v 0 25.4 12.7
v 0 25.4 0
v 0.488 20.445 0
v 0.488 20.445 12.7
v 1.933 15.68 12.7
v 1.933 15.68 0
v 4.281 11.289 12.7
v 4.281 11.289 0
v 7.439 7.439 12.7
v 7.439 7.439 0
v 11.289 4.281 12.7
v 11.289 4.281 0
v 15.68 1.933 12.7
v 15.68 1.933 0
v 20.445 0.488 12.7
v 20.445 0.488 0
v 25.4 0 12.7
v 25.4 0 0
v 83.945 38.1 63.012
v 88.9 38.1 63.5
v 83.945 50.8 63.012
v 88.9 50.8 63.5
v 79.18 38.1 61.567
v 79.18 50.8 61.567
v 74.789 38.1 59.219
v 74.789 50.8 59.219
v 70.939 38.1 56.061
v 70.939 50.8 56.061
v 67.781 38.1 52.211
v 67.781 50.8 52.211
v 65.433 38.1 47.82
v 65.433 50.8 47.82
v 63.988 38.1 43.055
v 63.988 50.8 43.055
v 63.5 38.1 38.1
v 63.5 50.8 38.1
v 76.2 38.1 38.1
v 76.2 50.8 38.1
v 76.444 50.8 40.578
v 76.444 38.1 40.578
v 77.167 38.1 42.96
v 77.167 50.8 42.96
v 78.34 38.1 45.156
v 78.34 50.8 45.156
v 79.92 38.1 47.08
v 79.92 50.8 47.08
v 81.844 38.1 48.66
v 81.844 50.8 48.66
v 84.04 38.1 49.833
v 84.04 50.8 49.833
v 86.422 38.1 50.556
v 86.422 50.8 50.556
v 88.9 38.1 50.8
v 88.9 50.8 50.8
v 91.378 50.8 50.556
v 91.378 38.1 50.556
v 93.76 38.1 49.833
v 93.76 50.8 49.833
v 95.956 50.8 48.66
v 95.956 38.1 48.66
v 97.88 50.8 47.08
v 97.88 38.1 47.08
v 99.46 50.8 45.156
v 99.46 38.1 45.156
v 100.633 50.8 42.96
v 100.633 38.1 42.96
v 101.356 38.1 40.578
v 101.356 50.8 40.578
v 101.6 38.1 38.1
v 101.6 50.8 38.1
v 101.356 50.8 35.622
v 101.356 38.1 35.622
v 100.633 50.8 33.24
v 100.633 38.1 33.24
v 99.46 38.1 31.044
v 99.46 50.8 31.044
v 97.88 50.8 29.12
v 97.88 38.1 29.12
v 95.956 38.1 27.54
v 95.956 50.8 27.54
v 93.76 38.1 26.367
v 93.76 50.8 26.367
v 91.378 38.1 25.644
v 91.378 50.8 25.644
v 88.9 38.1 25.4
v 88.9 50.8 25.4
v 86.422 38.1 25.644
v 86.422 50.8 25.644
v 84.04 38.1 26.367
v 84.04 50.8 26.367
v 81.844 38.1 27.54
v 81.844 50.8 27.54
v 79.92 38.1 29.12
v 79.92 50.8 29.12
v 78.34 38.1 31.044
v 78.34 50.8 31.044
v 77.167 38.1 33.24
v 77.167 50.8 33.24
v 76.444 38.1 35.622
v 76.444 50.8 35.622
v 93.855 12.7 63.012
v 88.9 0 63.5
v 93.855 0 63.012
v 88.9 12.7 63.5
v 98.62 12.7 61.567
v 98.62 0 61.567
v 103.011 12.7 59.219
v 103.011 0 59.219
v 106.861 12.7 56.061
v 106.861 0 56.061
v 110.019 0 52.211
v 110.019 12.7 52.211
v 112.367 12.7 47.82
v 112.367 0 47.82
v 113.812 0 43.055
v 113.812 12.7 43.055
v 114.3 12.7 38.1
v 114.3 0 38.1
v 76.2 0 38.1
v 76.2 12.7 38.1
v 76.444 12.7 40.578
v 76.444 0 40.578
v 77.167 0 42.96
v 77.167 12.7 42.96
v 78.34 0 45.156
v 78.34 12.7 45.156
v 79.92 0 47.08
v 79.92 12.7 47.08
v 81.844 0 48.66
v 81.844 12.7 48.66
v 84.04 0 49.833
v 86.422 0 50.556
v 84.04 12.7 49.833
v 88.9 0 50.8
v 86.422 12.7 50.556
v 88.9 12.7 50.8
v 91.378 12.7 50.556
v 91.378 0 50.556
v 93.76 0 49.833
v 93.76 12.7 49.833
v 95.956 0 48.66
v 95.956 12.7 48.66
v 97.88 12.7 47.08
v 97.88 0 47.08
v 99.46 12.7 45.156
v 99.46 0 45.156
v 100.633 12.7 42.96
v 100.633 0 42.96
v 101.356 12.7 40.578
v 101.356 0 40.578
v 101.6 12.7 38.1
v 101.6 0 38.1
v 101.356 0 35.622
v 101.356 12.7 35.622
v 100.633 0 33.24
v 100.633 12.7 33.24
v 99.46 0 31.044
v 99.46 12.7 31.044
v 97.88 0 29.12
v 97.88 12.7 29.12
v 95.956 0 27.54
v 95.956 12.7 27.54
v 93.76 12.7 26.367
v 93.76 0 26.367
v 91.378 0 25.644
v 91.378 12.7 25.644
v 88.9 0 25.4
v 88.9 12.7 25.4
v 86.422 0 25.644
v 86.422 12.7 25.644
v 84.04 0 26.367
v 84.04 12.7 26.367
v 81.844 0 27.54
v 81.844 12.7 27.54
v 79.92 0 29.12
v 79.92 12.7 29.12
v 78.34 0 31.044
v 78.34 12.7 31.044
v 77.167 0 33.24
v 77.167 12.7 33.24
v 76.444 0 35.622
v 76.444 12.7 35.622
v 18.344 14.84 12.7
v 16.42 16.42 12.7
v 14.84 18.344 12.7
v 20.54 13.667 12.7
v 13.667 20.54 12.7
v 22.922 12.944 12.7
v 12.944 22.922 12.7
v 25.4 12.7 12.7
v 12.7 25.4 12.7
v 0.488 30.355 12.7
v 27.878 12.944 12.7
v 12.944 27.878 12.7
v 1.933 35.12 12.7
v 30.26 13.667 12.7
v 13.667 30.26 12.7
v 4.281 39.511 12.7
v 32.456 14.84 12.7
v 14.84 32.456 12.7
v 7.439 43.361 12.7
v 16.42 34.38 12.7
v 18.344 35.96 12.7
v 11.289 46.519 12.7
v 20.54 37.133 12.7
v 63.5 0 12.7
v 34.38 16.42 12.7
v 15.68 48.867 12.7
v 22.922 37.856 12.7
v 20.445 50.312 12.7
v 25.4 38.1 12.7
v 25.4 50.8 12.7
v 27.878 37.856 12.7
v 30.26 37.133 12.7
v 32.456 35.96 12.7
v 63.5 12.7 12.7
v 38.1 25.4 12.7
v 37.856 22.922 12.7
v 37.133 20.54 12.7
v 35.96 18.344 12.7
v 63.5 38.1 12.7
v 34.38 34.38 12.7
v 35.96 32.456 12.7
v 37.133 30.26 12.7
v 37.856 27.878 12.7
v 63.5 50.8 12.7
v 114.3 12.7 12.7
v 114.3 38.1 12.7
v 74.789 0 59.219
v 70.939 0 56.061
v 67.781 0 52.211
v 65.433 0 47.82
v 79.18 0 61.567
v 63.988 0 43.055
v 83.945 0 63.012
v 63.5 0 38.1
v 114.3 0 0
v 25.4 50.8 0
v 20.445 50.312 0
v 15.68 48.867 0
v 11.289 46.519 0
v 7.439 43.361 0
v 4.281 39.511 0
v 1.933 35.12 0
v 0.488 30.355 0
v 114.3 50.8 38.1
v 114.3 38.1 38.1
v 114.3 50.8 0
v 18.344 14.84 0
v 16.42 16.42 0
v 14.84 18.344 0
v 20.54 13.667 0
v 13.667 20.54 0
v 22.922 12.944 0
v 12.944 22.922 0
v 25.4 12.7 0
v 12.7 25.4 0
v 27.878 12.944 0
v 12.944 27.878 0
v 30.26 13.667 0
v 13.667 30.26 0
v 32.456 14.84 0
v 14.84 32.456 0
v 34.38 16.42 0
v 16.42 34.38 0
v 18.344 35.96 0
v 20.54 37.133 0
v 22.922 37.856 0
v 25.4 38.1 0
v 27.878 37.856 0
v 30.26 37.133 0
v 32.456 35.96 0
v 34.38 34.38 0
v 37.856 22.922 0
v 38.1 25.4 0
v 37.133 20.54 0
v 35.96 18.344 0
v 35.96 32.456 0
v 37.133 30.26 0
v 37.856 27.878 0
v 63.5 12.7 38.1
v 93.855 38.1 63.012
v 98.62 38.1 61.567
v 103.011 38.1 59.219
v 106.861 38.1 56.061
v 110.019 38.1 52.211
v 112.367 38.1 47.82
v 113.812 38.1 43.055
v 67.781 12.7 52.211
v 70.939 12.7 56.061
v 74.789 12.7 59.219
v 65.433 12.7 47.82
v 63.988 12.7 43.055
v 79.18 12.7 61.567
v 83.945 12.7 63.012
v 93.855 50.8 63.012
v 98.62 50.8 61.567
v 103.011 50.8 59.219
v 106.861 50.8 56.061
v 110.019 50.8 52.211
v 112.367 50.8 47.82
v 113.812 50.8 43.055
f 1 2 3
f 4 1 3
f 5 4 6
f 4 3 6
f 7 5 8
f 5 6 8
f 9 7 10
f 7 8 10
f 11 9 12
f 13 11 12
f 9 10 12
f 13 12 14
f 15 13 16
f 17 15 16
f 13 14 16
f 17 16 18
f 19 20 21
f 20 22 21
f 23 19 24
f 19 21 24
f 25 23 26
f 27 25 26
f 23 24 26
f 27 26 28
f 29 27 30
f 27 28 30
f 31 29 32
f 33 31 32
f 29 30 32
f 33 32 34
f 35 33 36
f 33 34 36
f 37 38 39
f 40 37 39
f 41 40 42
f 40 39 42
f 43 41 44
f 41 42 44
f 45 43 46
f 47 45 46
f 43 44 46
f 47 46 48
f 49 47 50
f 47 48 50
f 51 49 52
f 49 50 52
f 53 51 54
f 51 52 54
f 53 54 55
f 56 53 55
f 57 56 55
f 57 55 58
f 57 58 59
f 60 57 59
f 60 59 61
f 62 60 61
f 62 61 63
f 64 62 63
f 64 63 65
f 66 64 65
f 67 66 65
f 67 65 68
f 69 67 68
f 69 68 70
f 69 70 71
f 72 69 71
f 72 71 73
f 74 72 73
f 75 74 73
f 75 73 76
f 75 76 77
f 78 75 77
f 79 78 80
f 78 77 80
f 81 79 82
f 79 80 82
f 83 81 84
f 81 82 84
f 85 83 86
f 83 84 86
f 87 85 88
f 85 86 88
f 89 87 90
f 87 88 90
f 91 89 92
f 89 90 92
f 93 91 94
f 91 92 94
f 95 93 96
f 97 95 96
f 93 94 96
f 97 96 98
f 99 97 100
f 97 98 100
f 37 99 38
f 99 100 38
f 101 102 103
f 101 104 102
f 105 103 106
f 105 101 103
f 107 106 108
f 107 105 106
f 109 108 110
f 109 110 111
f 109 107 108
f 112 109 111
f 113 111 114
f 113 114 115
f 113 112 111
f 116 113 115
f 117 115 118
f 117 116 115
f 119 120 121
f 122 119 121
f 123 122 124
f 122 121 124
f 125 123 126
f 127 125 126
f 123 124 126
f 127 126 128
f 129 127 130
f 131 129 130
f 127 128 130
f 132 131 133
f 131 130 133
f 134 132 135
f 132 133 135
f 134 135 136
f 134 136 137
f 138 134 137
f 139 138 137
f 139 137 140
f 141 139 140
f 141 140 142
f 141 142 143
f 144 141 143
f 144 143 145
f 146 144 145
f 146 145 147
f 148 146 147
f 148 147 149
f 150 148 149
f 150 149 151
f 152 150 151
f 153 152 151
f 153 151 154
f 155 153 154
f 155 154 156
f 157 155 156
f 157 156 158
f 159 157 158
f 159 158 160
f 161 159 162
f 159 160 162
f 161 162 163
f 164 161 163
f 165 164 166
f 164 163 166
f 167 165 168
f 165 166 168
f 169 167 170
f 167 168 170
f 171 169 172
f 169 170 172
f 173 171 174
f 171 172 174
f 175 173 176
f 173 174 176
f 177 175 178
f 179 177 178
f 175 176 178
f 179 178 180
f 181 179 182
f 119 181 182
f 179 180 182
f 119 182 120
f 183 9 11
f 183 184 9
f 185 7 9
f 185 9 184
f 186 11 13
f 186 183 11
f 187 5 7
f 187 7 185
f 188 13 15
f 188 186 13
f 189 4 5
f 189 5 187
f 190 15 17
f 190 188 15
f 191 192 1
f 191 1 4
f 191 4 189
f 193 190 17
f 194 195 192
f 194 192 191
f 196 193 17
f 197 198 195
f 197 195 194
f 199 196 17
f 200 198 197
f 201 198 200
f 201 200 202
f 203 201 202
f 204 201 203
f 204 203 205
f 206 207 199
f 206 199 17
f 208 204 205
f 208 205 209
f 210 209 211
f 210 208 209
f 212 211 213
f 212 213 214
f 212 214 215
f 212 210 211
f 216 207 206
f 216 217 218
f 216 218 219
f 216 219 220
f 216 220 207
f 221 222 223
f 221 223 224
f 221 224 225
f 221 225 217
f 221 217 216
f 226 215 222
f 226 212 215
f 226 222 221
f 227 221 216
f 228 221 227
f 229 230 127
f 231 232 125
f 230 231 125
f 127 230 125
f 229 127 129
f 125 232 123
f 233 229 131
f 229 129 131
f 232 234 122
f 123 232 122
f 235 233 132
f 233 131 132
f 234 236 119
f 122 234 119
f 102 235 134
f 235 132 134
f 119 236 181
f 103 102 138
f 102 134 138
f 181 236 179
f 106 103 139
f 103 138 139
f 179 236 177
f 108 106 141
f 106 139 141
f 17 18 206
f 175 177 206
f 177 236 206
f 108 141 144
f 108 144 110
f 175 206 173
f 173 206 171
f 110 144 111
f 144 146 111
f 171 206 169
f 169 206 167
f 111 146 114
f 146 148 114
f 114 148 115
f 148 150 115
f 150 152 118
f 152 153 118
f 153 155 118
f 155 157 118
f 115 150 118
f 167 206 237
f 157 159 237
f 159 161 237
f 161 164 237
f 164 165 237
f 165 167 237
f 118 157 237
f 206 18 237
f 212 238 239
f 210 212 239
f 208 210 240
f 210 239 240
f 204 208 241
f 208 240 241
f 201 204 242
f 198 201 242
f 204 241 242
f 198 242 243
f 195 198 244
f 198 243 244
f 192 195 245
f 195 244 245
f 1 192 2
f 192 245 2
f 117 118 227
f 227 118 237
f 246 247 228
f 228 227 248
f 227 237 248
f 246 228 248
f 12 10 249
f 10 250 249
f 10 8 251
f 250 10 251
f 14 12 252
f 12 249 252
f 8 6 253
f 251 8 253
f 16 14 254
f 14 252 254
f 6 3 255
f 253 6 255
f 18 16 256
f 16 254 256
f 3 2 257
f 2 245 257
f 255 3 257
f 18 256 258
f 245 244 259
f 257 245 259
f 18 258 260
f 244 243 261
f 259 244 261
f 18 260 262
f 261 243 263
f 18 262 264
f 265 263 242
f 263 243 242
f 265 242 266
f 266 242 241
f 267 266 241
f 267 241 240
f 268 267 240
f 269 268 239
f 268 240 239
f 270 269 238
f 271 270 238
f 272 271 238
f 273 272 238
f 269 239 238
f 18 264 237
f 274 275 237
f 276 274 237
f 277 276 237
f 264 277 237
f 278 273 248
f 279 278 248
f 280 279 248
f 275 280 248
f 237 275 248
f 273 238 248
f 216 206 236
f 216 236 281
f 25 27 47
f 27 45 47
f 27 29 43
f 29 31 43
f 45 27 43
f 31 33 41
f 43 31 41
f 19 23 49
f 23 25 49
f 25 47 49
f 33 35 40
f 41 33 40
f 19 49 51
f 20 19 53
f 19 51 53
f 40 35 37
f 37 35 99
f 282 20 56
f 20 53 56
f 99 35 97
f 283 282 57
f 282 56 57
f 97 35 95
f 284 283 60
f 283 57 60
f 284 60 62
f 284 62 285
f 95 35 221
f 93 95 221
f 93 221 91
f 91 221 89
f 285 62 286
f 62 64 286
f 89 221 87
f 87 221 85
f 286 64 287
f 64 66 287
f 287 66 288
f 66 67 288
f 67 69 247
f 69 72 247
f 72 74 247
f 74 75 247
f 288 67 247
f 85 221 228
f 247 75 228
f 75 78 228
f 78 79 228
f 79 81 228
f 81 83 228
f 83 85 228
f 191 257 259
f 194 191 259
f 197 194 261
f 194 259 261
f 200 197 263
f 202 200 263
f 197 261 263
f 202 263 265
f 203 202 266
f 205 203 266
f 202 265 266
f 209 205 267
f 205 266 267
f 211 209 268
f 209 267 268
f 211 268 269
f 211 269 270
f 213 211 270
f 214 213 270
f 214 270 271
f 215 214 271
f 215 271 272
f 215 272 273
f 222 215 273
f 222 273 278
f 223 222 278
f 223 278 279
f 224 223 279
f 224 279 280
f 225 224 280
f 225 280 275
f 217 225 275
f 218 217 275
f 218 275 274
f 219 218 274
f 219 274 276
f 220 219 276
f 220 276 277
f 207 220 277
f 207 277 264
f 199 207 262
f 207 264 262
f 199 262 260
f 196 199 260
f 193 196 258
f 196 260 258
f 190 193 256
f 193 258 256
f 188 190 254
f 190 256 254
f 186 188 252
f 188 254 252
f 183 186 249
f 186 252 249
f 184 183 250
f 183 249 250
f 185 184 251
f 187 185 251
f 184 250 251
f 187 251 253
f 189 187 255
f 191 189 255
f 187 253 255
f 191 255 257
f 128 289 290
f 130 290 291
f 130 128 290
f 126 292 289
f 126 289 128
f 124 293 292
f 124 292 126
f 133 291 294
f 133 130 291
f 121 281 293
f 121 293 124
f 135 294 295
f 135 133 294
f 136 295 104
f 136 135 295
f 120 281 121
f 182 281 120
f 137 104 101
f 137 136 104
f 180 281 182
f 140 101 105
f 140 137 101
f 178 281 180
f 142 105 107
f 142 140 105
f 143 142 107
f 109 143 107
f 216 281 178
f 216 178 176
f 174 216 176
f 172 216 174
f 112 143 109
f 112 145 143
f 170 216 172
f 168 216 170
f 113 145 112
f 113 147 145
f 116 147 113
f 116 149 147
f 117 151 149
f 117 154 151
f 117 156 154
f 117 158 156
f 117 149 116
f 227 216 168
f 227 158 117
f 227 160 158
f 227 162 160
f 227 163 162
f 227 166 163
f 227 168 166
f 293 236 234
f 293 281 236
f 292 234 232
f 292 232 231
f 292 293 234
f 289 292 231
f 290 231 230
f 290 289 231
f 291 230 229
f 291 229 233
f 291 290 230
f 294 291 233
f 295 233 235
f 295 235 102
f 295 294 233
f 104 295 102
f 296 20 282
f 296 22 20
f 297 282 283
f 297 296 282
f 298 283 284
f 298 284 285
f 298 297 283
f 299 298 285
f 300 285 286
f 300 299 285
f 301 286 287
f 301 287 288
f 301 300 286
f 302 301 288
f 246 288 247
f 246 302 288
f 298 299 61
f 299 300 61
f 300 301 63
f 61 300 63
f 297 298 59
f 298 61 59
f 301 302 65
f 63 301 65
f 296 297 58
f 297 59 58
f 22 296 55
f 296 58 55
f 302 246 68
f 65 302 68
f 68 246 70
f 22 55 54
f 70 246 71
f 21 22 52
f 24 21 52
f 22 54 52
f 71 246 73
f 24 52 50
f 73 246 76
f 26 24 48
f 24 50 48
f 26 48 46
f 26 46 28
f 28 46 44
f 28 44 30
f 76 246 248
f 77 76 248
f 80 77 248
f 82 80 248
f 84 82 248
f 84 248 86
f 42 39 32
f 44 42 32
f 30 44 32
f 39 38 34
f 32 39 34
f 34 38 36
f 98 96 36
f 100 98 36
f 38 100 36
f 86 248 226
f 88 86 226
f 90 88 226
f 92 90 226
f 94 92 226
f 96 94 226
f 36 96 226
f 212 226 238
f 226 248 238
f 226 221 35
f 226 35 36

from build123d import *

# Parameters (mm, degrees)
F1_DEPTH = 12.7
F2_W     = 50.8
F2_H     = 12.7
F3_DEPTH = 50.8
F4_D     = 25.4
F5_R     = 25.4
F6_R     = 25.39999
F7_R     = 25.4
F8_R     = 25.39999
F10_D    = 25.4


# Not quite as in the source:
# - a fillet or chamfer is up to 0.001 mm smaller than in the source, because OpenCascade refuses the exact size


with BuildPart() as f1:
    # F0 (on Top) → F1 (new body)
    with BuildSketch(Plane.XY):
        with BuildLine():
            ThreePointArc((0, 25.4), (7.4394877579, 7.4394877579), (25.4, 0))
            Line((25.4, 0), (114.3, 0))
            Line((114.3, 0), (114.3, 50.8))
            Line((114.3, 50.8), (25.4, 50.8))
            ThreePointArc((25.4, 50.8), (7.4394877579, 43.3605122421), (0, 25.4))
        make_face()
    extrude(amount=F1_DEPTH)

    # F2 (on face) → F3 (join)
    with BuildSketch(Plane.XY.offset(12.7)):
        with Locations((88.9, 6.35)):
            Rectangle(F2_W, F2_H)
        with Locations((88.9, 44.45)):
            Rectangle(F2_W, F2_H)
    extrude(amount=F3_DEPTH)

    # F4 (through all)
    with Locations(Plane.XY.offset(12.7)):
        with Locations((25.4, 25.4)):
            Hole(F4_D / 2)

    # F5
    f5_edges = [f1.edges().sort_by_distance(p)[0] for p in [
        (63.5, 6.35, 63.5),
    ]]
    fillet(f5_edges, radius=F5_R)

    # F6 (radius 25.4 in the source; OpenCascade refuses exactly that, so slightly less here)
    f6_edges = [f1.edges().sort_by_distance(p)[0] for p in [
        (114.3, 6.35, 63.5),
    ]]
    fillet(f6_edges, radius=F6_R)

    # F7
    f7_edges = [f1.edges().sort_by_distance(p)[0] for p in [
        (63.5, 44.45, 63.5),
    ]]
    fillet(f7_edges, radius=F7_R)

    # F8 (radius 25.4 in the source; OpenCascade refuses exactly that, so slightly less here)
    f8_edges = [f1.edges().sort_by_distance(p)[0] for p in [
        (114.3, 44.45, 63.5),
    ]]
    fillet(f8_edges, radius=F8_R)

    # F10 (through all)
    with Locations(Plane.XZ):
        with Locations((88.9, 38.1)):
            Hole(F10_D / 2)


solid = f1.part
